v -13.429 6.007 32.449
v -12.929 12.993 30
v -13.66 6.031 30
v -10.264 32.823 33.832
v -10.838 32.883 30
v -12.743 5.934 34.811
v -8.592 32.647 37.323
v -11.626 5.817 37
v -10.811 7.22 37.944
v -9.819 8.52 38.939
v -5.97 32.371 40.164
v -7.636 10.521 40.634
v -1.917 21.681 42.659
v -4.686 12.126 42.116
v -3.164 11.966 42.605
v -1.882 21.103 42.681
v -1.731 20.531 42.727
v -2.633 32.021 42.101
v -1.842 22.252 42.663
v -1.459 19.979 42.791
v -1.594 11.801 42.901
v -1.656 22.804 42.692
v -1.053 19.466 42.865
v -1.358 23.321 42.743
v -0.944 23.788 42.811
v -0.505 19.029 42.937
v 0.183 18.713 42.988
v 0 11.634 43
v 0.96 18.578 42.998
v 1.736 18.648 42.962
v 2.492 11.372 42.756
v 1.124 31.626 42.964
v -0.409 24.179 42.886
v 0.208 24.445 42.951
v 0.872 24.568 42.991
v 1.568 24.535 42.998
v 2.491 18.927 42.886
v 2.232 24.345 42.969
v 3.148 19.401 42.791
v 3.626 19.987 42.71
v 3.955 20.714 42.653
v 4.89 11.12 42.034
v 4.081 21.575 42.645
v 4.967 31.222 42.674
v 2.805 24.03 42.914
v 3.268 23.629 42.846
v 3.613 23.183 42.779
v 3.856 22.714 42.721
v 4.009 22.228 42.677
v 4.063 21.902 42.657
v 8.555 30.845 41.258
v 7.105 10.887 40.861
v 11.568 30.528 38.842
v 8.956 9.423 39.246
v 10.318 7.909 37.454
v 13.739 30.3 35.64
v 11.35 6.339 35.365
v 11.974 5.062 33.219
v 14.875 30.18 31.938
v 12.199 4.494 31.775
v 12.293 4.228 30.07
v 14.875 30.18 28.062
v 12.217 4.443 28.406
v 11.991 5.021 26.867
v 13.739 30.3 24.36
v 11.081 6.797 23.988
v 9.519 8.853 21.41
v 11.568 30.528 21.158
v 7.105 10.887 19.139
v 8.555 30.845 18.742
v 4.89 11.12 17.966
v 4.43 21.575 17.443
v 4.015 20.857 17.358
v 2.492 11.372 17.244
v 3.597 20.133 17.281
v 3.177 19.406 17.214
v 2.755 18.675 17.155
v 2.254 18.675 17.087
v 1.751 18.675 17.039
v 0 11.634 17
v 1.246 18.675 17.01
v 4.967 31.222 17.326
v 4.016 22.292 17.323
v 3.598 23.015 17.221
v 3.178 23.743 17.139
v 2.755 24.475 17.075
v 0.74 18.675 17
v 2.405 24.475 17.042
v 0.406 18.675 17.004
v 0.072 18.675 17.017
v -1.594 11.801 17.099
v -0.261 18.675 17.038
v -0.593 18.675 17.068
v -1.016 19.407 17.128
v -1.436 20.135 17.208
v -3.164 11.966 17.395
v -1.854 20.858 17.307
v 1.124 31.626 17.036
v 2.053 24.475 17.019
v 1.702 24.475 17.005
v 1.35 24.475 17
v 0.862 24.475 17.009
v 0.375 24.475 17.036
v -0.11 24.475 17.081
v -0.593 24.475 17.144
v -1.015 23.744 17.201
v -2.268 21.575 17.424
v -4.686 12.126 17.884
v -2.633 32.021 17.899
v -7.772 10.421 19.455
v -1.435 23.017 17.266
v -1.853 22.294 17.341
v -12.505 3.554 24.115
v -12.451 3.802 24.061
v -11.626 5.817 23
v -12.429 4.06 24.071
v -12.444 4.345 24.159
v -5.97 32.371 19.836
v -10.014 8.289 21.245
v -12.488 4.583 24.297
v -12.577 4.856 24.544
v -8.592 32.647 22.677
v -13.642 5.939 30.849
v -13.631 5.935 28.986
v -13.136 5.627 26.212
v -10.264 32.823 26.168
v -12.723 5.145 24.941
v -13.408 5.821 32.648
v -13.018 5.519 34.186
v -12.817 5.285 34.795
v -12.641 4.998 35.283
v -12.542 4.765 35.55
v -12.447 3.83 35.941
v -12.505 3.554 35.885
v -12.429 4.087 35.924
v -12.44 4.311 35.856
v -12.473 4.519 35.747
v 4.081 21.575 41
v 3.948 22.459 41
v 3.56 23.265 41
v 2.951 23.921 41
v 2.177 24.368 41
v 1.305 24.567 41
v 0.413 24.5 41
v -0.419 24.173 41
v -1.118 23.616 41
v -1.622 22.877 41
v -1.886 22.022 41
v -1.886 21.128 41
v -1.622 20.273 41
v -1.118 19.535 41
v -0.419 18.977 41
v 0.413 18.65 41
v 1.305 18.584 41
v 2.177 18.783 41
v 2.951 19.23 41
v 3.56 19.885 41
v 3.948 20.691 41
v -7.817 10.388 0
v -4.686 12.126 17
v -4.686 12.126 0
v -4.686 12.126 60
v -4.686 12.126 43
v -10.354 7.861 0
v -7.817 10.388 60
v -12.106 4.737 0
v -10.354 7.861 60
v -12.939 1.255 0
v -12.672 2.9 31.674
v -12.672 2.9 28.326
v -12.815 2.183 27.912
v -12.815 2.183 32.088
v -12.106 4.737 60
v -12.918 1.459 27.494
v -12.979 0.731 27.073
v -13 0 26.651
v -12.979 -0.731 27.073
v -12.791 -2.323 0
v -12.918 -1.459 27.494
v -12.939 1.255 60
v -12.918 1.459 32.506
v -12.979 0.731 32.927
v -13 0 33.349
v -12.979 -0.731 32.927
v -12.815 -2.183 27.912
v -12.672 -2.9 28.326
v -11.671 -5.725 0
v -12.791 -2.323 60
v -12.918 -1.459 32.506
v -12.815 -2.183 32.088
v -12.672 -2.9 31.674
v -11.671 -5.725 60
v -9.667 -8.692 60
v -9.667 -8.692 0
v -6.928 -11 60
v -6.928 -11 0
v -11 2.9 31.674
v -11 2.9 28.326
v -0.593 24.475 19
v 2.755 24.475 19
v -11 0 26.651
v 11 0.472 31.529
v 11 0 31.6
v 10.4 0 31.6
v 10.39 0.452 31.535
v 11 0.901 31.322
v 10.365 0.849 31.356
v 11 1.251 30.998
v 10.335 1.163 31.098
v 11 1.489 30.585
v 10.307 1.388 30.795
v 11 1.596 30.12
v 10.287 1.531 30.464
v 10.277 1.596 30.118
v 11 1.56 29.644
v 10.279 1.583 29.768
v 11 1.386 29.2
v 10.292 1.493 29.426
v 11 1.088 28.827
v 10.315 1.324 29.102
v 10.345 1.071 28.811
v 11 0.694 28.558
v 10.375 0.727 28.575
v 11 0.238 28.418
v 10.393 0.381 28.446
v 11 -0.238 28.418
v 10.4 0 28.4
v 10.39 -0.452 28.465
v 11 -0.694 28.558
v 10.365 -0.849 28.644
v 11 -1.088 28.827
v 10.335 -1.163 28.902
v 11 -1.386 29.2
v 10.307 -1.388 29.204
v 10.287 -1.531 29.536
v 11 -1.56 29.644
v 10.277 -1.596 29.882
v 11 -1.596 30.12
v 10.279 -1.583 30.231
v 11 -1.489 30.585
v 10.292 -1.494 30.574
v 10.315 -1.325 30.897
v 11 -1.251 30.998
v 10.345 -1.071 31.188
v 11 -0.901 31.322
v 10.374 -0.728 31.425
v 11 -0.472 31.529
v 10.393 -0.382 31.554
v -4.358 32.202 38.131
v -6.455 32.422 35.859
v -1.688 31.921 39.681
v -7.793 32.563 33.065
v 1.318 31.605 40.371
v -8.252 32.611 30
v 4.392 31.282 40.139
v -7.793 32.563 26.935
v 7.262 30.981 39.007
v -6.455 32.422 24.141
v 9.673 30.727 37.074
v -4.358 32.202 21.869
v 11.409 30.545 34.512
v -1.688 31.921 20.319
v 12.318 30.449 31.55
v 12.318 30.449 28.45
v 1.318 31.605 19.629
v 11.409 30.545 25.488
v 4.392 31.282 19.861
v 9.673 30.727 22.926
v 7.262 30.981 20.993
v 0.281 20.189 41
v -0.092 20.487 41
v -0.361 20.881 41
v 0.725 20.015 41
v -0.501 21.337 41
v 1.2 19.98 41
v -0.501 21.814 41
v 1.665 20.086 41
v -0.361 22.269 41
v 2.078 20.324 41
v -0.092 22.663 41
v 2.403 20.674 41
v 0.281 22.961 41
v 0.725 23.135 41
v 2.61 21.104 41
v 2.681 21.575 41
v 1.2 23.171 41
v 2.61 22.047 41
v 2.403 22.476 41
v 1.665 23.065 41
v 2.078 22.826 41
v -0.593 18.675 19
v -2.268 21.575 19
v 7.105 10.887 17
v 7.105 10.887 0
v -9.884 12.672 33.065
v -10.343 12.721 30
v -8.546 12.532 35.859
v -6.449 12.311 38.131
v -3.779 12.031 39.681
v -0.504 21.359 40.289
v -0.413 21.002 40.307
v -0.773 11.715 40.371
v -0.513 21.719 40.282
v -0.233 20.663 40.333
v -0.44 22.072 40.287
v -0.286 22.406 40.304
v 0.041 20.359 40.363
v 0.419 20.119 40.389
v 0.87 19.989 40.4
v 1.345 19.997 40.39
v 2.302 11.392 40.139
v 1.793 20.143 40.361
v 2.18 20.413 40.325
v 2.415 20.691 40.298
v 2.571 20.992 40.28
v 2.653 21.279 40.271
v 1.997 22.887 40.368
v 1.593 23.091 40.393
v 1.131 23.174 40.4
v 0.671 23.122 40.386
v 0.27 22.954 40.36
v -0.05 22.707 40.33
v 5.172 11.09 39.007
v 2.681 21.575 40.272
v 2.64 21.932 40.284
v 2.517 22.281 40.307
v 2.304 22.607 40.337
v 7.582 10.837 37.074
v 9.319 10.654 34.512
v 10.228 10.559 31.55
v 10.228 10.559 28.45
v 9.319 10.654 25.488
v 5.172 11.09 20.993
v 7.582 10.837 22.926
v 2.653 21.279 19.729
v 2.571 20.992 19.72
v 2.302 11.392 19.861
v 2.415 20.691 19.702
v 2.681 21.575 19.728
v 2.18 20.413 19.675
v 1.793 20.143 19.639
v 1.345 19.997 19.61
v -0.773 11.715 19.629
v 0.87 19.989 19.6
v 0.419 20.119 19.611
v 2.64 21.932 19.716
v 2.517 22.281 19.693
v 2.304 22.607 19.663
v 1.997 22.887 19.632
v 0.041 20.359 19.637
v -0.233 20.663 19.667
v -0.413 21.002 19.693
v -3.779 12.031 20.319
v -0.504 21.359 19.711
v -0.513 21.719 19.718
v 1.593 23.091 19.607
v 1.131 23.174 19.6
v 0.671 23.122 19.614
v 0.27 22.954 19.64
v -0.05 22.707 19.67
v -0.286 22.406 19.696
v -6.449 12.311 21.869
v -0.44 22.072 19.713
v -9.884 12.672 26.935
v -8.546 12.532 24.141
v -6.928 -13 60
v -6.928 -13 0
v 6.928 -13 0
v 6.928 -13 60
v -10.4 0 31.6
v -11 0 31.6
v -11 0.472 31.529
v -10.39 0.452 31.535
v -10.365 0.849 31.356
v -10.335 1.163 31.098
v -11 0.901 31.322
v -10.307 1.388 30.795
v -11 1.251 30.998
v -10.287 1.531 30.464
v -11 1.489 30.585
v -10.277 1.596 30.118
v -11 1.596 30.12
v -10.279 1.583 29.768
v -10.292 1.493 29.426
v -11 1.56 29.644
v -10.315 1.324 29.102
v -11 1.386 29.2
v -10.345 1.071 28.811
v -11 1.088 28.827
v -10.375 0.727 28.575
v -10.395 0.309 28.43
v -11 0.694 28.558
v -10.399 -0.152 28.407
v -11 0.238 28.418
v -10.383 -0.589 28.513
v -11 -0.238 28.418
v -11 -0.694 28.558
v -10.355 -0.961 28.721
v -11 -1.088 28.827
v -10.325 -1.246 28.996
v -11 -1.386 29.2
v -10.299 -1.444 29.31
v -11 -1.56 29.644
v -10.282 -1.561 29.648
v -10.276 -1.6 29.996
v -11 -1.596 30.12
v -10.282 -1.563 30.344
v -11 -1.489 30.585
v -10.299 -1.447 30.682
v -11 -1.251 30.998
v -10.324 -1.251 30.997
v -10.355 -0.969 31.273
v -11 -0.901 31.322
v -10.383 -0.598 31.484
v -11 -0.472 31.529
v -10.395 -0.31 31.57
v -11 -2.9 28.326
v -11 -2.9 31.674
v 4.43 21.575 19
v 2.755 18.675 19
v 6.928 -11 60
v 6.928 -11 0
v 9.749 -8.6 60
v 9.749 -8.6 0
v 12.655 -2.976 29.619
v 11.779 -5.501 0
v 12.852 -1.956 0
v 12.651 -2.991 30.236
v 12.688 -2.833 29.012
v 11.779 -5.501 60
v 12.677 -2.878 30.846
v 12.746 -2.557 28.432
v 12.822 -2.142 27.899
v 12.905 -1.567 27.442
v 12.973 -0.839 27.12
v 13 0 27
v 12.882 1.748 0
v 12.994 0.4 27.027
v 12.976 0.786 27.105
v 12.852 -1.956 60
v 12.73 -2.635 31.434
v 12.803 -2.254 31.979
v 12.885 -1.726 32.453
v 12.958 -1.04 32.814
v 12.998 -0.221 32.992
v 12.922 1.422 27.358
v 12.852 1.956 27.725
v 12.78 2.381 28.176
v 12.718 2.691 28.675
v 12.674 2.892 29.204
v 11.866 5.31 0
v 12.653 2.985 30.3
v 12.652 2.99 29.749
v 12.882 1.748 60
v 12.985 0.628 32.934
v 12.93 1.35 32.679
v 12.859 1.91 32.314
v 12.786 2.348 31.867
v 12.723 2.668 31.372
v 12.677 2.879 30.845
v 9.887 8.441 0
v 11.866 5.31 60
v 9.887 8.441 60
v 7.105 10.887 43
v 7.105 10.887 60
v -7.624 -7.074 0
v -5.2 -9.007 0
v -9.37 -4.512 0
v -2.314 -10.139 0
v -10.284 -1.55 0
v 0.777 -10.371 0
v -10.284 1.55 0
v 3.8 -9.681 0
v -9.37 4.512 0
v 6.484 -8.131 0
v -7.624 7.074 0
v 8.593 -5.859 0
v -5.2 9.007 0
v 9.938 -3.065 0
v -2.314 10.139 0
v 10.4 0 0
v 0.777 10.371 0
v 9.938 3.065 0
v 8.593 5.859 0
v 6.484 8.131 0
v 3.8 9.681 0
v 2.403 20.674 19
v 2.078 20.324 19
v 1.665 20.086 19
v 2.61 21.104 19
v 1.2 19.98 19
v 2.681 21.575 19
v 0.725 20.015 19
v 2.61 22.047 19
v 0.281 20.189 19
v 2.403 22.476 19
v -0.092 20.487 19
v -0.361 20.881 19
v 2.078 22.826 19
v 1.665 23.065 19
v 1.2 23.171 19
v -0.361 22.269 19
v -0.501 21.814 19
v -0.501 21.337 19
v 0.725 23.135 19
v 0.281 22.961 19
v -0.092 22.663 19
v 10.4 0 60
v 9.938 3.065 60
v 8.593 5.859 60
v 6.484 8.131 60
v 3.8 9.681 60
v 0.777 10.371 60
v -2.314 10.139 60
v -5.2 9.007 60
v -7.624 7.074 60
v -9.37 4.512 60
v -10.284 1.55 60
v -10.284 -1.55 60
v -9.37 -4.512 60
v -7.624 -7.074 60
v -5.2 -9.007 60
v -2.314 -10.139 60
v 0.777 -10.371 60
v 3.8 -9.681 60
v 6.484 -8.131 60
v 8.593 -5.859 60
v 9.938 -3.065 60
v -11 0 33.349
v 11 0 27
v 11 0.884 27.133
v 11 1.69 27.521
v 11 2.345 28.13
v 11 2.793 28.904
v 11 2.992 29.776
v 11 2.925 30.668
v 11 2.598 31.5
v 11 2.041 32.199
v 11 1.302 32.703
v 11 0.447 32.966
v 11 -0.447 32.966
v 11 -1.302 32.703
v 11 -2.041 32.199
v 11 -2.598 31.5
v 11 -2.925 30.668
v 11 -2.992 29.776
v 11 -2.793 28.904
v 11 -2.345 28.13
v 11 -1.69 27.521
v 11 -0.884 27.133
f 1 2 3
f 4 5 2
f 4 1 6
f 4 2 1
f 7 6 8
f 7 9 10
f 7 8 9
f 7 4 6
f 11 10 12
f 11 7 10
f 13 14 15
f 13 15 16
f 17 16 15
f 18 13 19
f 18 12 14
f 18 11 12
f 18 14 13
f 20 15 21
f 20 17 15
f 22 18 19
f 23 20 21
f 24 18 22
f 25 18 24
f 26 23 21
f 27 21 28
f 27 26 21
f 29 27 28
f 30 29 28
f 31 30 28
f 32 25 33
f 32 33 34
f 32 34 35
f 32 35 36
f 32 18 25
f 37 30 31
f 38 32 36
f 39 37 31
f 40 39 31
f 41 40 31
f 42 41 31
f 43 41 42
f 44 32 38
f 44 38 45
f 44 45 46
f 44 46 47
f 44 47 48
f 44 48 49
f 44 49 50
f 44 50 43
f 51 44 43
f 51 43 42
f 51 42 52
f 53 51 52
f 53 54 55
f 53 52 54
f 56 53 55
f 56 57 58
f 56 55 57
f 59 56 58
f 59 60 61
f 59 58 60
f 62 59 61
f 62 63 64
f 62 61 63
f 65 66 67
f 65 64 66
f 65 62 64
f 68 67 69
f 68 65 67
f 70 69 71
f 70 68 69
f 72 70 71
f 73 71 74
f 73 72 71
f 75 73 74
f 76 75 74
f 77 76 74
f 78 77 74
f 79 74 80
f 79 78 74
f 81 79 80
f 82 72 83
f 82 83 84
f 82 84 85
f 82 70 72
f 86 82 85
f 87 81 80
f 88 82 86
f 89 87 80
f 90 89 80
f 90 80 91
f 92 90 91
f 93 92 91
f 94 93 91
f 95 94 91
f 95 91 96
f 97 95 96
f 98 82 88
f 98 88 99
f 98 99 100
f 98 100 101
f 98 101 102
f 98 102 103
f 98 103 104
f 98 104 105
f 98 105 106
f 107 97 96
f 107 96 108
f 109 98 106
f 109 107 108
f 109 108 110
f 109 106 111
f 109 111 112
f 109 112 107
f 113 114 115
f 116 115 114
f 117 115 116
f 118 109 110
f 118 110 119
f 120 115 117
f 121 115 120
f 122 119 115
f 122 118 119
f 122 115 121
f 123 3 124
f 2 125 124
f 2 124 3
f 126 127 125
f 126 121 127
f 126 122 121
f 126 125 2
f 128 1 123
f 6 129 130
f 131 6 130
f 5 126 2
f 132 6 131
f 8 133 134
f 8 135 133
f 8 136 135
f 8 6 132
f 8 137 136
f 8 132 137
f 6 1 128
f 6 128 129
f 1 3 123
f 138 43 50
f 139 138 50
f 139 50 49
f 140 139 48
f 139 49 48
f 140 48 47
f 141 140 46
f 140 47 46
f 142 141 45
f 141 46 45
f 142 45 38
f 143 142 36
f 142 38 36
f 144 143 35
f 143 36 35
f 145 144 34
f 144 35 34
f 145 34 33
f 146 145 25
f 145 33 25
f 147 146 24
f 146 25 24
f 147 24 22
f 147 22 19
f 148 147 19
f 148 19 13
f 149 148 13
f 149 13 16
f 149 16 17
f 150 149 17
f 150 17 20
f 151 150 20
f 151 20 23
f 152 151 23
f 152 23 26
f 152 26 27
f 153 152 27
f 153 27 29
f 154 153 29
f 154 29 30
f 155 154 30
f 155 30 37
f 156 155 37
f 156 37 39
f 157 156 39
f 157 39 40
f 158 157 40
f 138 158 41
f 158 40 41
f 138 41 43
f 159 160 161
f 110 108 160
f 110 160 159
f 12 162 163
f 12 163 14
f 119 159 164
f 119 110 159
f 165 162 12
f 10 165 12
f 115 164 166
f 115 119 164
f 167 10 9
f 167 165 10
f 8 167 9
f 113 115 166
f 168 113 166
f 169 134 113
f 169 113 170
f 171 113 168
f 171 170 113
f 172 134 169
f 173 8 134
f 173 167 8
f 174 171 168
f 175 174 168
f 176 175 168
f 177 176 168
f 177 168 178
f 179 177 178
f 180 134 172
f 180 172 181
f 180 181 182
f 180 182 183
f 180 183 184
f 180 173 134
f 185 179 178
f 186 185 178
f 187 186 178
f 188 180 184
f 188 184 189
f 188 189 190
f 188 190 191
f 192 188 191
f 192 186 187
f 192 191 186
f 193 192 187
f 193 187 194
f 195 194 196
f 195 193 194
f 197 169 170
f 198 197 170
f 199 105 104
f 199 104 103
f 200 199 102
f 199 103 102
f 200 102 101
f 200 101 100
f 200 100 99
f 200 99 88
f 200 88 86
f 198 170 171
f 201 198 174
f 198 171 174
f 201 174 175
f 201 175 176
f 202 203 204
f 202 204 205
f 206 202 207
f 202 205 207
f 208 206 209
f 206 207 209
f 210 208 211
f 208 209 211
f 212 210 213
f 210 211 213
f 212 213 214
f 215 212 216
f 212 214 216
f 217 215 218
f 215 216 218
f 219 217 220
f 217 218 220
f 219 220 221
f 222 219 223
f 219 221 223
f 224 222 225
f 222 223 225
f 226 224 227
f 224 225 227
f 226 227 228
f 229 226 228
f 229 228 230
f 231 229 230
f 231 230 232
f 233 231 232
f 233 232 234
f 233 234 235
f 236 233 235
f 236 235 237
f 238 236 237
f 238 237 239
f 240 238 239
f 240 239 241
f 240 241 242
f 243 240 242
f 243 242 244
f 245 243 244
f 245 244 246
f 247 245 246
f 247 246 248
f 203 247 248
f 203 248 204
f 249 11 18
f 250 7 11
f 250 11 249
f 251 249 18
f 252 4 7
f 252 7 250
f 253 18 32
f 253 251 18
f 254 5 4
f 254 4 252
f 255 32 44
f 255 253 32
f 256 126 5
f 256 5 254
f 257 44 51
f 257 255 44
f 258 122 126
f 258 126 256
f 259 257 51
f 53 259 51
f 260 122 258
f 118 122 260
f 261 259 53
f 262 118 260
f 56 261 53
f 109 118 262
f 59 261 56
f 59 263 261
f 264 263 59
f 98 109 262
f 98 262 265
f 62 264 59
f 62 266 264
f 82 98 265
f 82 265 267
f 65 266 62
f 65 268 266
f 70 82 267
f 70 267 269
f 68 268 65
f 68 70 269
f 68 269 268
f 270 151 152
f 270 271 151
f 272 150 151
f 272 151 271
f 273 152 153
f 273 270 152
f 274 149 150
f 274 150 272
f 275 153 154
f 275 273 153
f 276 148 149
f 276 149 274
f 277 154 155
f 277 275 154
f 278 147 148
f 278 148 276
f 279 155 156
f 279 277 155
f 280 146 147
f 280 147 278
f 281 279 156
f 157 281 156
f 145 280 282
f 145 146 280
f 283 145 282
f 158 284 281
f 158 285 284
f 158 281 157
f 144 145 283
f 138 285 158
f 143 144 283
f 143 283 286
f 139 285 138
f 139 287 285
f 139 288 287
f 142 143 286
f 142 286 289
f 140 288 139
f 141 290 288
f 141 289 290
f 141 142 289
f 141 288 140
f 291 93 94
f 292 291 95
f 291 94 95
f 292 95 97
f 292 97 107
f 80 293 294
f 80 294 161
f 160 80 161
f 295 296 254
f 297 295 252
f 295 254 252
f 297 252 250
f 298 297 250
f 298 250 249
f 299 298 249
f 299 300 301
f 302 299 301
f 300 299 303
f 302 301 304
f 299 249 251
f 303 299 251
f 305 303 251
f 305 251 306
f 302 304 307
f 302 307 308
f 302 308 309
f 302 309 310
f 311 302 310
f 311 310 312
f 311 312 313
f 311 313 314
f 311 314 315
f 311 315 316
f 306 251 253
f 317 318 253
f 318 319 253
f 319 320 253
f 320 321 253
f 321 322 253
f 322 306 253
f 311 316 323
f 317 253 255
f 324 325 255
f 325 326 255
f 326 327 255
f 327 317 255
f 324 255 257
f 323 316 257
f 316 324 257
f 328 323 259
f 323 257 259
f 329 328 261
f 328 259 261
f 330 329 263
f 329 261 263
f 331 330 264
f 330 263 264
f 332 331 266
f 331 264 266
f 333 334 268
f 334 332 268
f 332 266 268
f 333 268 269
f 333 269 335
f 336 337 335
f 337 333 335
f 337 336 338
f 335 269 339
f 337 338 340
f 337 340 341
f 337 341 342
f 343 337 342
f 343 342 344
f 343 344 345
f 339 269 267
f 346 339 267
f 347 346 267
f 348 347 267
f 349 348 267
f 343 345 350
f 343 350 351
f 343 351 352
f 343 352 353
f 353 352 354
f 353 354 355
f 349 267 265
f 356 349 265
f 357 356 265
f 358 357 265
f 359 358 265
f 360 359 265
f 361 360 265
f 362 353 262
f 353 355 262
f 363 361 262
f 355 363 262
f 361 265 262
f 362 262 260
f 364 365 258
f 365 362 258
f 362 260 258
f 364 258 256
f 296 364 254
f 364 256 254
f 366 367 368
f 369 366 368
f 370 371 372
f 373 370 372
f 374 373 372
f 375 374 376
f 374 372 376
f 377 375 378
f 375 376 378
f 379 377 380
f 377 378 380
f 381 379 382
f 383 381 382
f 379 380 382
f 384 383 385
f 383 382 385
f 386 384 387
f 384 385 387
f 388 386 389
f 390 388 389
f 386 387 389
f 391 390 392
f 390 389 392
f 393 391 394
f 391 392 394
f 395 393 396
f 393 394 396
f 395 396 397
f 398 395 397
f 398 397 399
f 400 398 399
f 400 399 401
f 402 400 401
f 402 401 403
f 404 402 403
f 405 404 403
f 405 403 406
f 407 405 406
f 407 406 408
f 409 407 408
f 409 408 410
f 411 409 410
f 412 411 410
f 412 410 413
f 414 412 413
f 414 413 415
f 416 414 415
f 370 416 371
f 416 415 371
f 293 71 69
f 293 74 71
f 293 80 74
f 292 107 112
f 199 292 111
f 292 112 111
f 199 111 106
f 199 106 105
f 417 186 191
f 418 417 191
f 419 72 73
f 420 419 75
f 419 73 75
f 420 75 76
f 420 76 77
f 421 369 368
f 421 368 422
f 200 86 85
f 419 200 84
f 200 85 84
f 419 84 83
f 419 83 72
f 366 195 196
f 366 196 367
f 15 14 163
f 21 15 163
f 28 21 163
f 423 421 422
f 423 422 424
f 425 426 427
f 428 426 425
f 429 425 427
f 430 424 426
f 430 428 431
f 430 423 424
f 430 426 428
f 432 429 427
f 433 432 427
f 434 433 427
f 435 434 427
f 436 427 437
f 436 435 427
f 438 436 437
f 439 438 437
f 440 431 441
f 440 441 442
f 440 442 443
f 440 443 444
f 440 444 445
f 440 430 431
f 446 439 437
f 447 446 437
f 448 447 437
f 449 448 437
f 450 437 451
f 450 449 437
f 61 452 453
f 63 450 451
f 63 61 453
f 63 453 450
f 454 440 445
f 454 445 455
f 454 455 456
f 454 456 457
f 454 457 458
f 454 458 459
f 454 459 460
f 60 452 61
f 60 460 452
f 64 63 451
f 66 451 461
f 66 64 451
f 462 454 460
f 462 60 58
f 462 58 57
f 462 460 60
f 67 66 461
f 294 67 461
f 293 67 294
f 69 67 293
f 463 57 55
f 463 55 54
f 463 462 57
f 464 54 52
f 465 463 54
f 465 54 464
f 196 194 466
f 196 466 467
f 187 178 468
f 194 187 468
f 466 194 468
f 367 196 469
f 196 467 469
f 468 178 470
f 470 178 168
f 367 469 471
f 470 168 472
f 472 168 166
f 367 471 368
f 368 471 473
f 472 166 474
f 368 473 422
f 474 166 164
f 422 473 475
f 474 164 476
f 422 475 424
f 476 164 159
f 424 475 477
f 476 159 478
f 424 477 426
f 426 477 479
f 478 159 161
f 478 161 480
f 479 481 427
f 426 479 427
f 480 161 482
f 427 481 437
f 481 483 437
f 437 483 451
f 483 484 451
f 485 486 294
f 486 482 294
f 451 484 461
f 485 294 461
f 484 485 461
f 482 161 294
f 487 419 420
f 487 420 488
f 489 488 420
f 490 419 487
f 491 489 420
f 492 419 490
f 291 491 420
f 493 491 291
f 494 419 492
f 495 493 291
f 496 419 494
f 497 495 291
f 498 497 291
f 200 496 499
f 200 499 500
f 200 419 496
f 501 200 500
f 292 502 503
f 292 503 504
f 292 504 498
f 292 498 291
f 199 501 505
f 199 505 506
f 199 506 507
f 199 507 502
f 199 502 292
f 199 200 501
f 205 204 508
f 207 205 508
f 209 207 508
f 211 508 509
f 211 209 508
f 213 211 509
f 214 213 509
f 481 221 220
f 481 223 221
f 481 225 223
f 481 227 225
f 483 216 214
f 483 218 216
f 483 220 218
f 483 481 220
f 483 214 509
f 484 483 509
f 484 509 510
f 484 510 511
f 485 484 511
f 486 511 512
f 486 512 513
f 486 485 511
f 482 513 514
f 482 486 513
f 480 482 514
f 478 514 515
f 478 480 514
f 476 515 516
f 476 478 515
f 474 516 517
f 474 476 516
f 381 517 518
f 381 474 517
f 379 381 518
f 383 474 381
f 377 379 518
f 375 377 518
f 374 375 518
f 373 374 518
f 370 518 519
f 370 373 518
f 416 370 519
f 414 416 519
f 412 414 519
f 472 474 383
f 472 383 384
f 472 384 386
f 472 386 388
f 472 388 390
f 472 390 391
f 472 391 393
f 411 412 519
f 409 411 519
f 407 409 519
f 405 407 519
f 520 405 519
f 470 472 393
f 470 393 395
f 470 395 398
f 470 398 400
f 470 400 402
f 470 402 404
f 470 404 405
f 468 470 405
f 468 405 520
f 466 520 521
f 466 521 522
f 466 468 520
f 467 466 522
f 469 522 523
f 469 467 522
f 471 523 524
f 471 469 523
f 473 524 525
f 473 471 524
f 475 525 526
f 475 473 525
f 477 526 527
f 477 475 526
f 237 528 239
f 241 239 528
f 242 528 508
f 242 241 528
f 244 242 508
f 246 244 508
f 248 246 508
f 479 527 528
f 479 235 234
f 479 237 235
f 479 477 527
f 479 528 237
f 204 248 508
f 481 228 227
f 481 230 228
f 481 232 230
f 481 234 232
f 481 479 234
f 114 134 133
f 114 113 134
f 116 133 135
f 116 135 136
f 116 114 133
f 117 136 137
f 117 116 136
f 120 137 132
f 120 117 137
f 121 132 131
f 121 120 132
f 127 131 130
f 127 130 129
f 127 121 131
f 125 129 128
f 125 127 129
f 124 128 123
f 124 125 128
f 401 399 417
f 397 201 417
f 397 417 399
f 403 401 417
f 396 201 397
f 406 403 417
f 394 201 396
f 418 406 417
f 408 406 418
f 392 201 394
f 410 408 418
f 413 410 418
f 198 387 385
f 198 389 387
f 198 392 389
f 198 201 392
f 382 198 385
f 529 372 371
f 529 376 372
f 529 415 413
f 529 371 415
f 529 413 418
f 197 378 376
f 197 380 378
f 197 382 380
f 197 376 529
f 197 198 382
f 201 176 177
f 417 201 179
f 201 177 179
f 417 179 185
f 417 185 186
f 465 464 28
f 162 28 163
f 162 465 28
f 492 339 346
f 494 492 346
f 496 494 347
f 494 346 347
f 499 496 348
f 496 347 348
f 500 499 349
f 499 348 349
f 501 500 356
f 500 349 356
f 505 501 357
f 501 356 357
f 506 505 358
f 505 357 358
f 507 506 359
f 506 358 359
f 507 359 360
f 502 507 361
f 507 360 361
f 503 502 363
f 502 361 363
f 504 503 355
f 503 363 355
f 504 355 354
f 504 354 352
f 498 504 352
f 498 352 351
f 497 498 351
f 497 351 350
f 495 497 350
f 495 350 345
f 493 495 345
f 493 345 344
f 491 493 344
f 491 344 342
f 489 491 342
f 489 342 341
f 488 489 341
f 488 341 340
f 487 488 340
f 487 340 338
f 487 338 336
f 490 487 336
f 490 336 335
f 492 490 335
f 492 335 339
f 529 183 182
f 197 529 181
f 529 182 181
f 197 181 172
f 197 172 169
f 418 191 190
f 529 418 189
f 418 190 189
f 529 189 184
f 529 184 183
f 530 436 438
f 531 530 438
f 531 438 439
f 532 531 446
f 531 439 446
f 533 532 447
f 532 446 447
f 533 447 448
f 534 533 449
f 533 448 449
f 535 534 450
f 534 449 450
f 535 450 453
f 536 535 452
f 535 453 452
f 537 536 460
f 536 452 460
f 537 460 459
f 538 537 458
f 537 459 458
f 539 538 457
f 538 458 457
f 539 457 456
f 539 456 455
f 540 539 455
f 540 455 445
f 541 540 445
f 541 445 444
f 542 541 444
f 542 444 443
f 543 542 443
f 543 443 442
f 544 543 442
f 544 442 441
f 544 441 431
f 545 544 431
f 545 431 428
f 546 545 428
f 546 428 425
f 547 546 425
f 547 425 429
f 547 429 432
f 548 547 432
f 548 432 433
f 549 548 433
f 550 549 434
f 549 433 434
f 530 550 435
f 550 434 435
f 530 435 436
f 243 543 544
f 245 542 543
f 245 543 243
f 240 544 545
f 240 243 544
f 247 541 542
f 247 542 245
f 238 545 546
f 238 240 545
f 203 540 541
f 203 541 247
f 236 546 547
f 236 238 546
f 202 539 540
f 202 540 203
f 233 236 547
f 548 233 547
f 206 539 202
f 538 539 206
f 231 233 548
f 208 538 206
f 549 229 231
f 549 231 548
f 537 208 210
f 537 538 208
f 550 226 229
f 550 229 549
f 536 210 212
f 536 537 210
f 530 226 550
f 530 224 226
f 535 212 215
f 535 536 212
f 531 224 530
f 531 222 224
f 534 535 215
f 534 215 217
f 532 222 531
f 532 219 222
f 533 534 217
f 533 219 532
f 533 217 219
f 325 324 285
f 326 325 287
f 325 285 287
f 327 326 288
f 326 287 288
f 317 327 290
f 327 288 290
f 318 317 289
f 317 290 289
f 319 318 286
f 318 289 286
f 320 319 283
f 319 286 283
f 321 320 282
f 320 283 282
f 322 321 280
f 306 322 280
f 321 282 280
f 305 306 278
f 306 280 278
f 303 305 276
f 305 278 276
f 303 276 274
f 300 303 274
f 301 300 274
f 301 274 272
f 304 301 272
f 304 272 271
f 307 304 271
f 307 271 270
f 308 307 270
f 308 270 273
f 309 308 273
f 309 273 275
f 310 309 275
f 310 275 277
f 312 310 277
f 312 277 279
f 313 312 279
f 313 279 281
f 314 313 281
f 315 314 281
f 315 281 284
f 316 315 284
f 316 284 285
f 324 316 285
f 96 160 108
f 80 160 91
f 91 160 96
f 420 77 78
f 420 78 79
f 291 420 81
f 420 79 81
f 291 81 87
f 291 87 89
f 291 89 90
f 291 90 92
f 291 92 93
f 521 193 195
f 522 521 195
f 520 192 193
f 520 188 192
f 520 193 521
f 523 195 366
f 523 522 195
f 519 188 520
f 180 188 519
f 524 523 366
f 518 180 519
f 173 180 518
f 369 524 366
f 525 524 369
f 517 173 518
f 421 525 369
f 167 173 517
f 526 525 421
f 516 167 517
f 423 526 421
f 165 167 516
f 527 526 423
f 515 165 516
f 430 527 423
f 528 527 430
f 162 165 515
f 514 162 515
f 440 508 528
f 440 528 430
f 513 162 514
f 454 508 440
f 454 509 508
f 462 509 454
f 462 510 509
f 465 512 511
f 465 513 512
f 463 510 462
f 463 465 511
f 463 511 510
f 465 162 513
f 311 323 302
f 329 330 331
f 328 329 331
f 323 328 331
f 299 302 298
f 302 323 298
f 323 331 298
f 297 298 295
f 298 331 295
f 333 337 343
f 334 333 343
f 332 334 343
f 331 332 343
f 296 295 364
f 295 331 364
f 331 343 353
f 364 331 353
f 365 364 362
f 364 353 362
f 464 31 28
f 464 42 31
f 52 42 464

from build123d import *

# Parameters (mm, degrees)
SKETCH1_W            = 26
SKETCH1_H            = 26
SKETCH1_R            = 10.4
BOSS_EXTRUDE2_DEPTH  = 60
SKETCH2_R            = 1.6
CUT_EXTRUDE1_DEPTH   = 67.670833203
CUT_EXTRUDE2_DEPTH   = 2
SKETCH4_R            = 3
CUT_EXTRUDE3_DEPTH   = 2
CUT_EXTRUDE5_DEPTH   = 63.753486055
SKETCH7_W            = 26
SKETCH7_H            = 26
BOSS_EXTRUDE3_DEPTH  = 20
SKETCH8_R            = 1.6
CUT_EXTRUDE6_DEPTH   = 57.177126928
SKETCH9_R            = 3
CUT_EXTRUDE7_DEPTH   = 2
CUT_EXTRUDE8_DEPTH   = 2
SKETCH11_OUTSIDE_W   = 50.774
SKETCH11_OUTSIDE_H   = 78.112
SKETCH11_OUTSIDE_R   = 13
SKETCH11_OUTSIDE_R_2 = 10.4
CUT_EXTRUDE9_DEPTH   = 20
SKETCH5_OUTSIDE_W    = 46.131
SKETCH5_OUTSIDE_H    = 63.995
CUT_EXTRUDE4_DEPTH   = 71.049051406
SKETCH13_R           = 13
BOSS_EXTRUDE4_DEPTH  = 7
FILLET1_R            = 2
SKETCH14_R           = 10.4
CUT_EXTRUDE10_DEPTH  = 71.049051406


with BuildPart() as part:
    # Sketch1 → Boss-Extrude2 (new body)
    with BuildSketch(Plane.XY):
        Rectangle(SKETCH1_W, SKETCH1_H)
        Circle(SKETCH1_R, mode=Mode.SUBTRACT)
    extrude(amount=BOSS_EXTRUDE2_DEPTH)

    # Sketch2 → Cut-Extrude1 (cut, through all)
    with BuildSketch(Plane.ZY.offset(13)):
        with Locations((30, 0)):
            Circle(SKETCH2_R)
    extrude(amount=-CUT_EXTRUDE1_DEPTH, mode=Mode.SUBTRACT)

    # Sketch3 → Cut-Extrude2 (cut)
    with BuildSketch(Plane.ZY.offset(13)):
        Polygon((33.348631561, 0), (31.674315781, 2.9), (28.325684219, 2.9), (26.651368439, 0), (28.325684219, -2.9), (31.674315781, -2.9), align=None)
    extrude(amount=-CUT_EXTRUDE2_DEPTH, mode=Mode.SUBTRACT)

    # Sketch4 → Cut-Extrude3 (cut)
    with BuildSketch(Plane(origin=(13, 0, 0), x_dir=(0, 0, -1), z_dir=(1, 0, 0))):
        with Locations((-30, 0)):
            Circle(SKETCH4_R)
    extrude(amount=-CUT_EXTRUDE3_DEPTH, mode=Mode.SUBTRACT)

    # Sketch6 → Cut-Extrude5 (cut, through all)
    with BuildSketch(Plane.XY.offset(60)):
        Polygon((-13, 13), (13, 13), (13, 10.267289883), align=None)
    extrude(amount=-CUT_EXTRUDE5_DEPTH, mode=Mode.SUBTRACT)

    # Sketch7 → Boss-Extrude3 (add)
    with BuildSketch(Plane(origin=(1.209385395, 11.506533414, 0), x_dir=(0.9945218953682742, -0.1045284632676464, 0), z_dir=(0.1045284632676464, 0.9945218953682742, 0))):
        with Locations((-1.216047028, -30)):
            Rectangle(SKETCH7_W, SKETCH7_H)
    extrude(amount=BOSS_EXTRUDE3_DEPTH)

    # Sketch8 → Cut-Extrude6 (cut, through all)
    with BuildSketch(Plane.XY.offset(43)):
        with Locations((1.080892313, 21.575121377)):
            Circle(SKETCH8_R)
    extrude(amount=-CUT_EXTRUDE6_DEPTH, mode=Mode.SUBTRACT)

    # Sketch9 → Cut-Extrude7 (cut)
    with BuildSketch(Plane.XY.offset(43)):
        with Locations((1.080892313, 21.575121377)):
            Circle(SKETCH9_R)
    extrude(amount=-CUT_EXTRUDE7_DEPTH, mode=Mode.SUBTRACT)

    # Sketch10 → Cut-Extrude8 (cut)
    with BuildSketch(Plane(origin=(0, 0, 17), x_dir=(-1, 0, 0), z_dir=(0, 0, -1))):
        Polygon((2.267739249, 21.575121377), (0.593423468, 24.475121377), (-2.755208093, 24.475121377), (-4.429523874, 21.575121377), (-2.755208093, 18.675121377), (0.593423468, 18.675121377), align=None)
    extrude(amount=-CUT_EXTRUDE8_DEPTH, mode=Mode.SUBTRACT)

    # Sketch11 outside → Cut-Extrude9 (cut)
    # profile 1 of 2: a face of its own
    with BuildSketch(Plane(origin=(3.29995466, 31.396971322, 0), x_dir=(0.9945218953682742, -0.10452846326764643, 0), z_dir=(0.10452846326764643, 0.9945218953682742, 0))):
        with Locations((-0.035, -30)):
            Rectangle(SKETCH11_OUTSIDE_W, SKETCH11_OUTSIDE_H)
        with Locations(Location((-1.216047028, -30, 0), (0, 0, 180))):
            Circle(SKETCH11_OUTSIDE_R, mode=Mode.SUBTRACT)
    # profile 2 of 2: a face of its own
    with BuildSketch(Plane(origin=(3.29995466, 31.396971322, 0), x_dir=(0.9945218953682742, -0.10452846326764643, 0), z_dir=(0.10452846326764643, 0.9945218953682742, 0))):
        with Locations(Location((-1.216047028, -30, 0), (0, 0, 180))):
            Circle(SKETCH11_OUTSIDE_R_2)
    extrude(amount=-CUT_EXTRUDE9_DEPTH, mode=Mode.SUBTRACT)

    # Sketch5 outside → Cut-Extrude4 (cut, through all)
    with BuildSketch(Plane.XY.offset(60)):
        with Locations((1.0095, 9.9415)):
            Rectangle(SKETCH5_OUTSIDE_W, SKETCH5_OUTSIDE_H)
        with BuildLine():
            Line((-6.92820323, -11), (-6.92820323, -13))
            Line((-6.92820323, -13), (6.92820323, -13))
            Line((6.92820323, -13), (6.92820323, -11))
            ThreePointArc((6.92820323, -11), (12.999577974, -0.104749706), (7.104566567, 10.886924906))
            Line((7.104566567, 10.886924906), (13, 10.267289883))
            Line((13, 10.267289883), (15.291712761, 31.831368542))
            Line((15.291712761, 31.831368542), (-10.708287239, 34.594506849))
            Line((-10.708287239, 34.594506849), (-13, 13))
            Line((-13, 13), (-4.685795776, 12.126141923))
            ThreePointArc((-4.685795776, 12.126141923), (-12.939314251, 1.254650033), (-6.92820323, -11))
        make_face(mode=Mode.SUBTRACT)
    extrude(amount=-CUT_EXTRUDE4_DEPTH, mode=Mode.SUBTRACT)

    # Sketch13 → Boss-Extrude4 (add)
    with BuildSketch(Plane(origin=(1.209385395, 11.506533414, 0), x_dir=(0.9945218953682741, -0.10452846326764687, 0), z_dir=(-0.10452846326764687, -0.9945218953682741, 0))):
        with Locations(Location((-1.216047028, 30, 0), (0, 0, 180))):
            Circle(SKETCH13_R)
    extrude(amount=BOSS_EXTRUDE4_DEPTH)

    # Fillet1
    # the kernel refuses this fillet: 2 mm, written as the material it adds along each edge
    with BuildSketch(Plane(origin=(-11.625930527, 5.817021522, 16.479857089), x_dir=(-0.36199929686843824, -0.9321783676243277, 0), z_dir=(0, 0, 1))) as fillet1_piece_1_section:
        with BuildLine():
            CenterArc((2.614603278, -1.991261329), FILLET1_R, 95.358010672, 99.865019887)
            Line((0.684781224, -2.516415439), (0, 0))
            ThreePointArc((0, 0), (1.213922951, -0.056801359), (2.427845901, 0))
        make_face()
    fillet1_piece_1 = extrude(amount=27.040285822, mode=Mode.PRIVATE)
    fillet1_piece_1 = fillet1_piece_1 & Plane(origin=(-0.793541371, 4.083603133, 30), x_dir=(-0.9945218953682741, 0.10452846326764687, 0), z_dir=(0.10452846326764687, 0.9945218953682741, 0)) * Cylinder(13, 65, mode=Mode.PRIVATE)
    add(fillet1_piece_1)

    # Sketch14 → Cut-Extrude10 (cut, through all)
    with BuildSketch(Plane.XY.offset(60)):
        Circle(SKETCH14_R)
    extrude(amount=-CUT_EXTRUDE10_DEPTH, mode=Mode.SUBTRACT)


solid = part.part
